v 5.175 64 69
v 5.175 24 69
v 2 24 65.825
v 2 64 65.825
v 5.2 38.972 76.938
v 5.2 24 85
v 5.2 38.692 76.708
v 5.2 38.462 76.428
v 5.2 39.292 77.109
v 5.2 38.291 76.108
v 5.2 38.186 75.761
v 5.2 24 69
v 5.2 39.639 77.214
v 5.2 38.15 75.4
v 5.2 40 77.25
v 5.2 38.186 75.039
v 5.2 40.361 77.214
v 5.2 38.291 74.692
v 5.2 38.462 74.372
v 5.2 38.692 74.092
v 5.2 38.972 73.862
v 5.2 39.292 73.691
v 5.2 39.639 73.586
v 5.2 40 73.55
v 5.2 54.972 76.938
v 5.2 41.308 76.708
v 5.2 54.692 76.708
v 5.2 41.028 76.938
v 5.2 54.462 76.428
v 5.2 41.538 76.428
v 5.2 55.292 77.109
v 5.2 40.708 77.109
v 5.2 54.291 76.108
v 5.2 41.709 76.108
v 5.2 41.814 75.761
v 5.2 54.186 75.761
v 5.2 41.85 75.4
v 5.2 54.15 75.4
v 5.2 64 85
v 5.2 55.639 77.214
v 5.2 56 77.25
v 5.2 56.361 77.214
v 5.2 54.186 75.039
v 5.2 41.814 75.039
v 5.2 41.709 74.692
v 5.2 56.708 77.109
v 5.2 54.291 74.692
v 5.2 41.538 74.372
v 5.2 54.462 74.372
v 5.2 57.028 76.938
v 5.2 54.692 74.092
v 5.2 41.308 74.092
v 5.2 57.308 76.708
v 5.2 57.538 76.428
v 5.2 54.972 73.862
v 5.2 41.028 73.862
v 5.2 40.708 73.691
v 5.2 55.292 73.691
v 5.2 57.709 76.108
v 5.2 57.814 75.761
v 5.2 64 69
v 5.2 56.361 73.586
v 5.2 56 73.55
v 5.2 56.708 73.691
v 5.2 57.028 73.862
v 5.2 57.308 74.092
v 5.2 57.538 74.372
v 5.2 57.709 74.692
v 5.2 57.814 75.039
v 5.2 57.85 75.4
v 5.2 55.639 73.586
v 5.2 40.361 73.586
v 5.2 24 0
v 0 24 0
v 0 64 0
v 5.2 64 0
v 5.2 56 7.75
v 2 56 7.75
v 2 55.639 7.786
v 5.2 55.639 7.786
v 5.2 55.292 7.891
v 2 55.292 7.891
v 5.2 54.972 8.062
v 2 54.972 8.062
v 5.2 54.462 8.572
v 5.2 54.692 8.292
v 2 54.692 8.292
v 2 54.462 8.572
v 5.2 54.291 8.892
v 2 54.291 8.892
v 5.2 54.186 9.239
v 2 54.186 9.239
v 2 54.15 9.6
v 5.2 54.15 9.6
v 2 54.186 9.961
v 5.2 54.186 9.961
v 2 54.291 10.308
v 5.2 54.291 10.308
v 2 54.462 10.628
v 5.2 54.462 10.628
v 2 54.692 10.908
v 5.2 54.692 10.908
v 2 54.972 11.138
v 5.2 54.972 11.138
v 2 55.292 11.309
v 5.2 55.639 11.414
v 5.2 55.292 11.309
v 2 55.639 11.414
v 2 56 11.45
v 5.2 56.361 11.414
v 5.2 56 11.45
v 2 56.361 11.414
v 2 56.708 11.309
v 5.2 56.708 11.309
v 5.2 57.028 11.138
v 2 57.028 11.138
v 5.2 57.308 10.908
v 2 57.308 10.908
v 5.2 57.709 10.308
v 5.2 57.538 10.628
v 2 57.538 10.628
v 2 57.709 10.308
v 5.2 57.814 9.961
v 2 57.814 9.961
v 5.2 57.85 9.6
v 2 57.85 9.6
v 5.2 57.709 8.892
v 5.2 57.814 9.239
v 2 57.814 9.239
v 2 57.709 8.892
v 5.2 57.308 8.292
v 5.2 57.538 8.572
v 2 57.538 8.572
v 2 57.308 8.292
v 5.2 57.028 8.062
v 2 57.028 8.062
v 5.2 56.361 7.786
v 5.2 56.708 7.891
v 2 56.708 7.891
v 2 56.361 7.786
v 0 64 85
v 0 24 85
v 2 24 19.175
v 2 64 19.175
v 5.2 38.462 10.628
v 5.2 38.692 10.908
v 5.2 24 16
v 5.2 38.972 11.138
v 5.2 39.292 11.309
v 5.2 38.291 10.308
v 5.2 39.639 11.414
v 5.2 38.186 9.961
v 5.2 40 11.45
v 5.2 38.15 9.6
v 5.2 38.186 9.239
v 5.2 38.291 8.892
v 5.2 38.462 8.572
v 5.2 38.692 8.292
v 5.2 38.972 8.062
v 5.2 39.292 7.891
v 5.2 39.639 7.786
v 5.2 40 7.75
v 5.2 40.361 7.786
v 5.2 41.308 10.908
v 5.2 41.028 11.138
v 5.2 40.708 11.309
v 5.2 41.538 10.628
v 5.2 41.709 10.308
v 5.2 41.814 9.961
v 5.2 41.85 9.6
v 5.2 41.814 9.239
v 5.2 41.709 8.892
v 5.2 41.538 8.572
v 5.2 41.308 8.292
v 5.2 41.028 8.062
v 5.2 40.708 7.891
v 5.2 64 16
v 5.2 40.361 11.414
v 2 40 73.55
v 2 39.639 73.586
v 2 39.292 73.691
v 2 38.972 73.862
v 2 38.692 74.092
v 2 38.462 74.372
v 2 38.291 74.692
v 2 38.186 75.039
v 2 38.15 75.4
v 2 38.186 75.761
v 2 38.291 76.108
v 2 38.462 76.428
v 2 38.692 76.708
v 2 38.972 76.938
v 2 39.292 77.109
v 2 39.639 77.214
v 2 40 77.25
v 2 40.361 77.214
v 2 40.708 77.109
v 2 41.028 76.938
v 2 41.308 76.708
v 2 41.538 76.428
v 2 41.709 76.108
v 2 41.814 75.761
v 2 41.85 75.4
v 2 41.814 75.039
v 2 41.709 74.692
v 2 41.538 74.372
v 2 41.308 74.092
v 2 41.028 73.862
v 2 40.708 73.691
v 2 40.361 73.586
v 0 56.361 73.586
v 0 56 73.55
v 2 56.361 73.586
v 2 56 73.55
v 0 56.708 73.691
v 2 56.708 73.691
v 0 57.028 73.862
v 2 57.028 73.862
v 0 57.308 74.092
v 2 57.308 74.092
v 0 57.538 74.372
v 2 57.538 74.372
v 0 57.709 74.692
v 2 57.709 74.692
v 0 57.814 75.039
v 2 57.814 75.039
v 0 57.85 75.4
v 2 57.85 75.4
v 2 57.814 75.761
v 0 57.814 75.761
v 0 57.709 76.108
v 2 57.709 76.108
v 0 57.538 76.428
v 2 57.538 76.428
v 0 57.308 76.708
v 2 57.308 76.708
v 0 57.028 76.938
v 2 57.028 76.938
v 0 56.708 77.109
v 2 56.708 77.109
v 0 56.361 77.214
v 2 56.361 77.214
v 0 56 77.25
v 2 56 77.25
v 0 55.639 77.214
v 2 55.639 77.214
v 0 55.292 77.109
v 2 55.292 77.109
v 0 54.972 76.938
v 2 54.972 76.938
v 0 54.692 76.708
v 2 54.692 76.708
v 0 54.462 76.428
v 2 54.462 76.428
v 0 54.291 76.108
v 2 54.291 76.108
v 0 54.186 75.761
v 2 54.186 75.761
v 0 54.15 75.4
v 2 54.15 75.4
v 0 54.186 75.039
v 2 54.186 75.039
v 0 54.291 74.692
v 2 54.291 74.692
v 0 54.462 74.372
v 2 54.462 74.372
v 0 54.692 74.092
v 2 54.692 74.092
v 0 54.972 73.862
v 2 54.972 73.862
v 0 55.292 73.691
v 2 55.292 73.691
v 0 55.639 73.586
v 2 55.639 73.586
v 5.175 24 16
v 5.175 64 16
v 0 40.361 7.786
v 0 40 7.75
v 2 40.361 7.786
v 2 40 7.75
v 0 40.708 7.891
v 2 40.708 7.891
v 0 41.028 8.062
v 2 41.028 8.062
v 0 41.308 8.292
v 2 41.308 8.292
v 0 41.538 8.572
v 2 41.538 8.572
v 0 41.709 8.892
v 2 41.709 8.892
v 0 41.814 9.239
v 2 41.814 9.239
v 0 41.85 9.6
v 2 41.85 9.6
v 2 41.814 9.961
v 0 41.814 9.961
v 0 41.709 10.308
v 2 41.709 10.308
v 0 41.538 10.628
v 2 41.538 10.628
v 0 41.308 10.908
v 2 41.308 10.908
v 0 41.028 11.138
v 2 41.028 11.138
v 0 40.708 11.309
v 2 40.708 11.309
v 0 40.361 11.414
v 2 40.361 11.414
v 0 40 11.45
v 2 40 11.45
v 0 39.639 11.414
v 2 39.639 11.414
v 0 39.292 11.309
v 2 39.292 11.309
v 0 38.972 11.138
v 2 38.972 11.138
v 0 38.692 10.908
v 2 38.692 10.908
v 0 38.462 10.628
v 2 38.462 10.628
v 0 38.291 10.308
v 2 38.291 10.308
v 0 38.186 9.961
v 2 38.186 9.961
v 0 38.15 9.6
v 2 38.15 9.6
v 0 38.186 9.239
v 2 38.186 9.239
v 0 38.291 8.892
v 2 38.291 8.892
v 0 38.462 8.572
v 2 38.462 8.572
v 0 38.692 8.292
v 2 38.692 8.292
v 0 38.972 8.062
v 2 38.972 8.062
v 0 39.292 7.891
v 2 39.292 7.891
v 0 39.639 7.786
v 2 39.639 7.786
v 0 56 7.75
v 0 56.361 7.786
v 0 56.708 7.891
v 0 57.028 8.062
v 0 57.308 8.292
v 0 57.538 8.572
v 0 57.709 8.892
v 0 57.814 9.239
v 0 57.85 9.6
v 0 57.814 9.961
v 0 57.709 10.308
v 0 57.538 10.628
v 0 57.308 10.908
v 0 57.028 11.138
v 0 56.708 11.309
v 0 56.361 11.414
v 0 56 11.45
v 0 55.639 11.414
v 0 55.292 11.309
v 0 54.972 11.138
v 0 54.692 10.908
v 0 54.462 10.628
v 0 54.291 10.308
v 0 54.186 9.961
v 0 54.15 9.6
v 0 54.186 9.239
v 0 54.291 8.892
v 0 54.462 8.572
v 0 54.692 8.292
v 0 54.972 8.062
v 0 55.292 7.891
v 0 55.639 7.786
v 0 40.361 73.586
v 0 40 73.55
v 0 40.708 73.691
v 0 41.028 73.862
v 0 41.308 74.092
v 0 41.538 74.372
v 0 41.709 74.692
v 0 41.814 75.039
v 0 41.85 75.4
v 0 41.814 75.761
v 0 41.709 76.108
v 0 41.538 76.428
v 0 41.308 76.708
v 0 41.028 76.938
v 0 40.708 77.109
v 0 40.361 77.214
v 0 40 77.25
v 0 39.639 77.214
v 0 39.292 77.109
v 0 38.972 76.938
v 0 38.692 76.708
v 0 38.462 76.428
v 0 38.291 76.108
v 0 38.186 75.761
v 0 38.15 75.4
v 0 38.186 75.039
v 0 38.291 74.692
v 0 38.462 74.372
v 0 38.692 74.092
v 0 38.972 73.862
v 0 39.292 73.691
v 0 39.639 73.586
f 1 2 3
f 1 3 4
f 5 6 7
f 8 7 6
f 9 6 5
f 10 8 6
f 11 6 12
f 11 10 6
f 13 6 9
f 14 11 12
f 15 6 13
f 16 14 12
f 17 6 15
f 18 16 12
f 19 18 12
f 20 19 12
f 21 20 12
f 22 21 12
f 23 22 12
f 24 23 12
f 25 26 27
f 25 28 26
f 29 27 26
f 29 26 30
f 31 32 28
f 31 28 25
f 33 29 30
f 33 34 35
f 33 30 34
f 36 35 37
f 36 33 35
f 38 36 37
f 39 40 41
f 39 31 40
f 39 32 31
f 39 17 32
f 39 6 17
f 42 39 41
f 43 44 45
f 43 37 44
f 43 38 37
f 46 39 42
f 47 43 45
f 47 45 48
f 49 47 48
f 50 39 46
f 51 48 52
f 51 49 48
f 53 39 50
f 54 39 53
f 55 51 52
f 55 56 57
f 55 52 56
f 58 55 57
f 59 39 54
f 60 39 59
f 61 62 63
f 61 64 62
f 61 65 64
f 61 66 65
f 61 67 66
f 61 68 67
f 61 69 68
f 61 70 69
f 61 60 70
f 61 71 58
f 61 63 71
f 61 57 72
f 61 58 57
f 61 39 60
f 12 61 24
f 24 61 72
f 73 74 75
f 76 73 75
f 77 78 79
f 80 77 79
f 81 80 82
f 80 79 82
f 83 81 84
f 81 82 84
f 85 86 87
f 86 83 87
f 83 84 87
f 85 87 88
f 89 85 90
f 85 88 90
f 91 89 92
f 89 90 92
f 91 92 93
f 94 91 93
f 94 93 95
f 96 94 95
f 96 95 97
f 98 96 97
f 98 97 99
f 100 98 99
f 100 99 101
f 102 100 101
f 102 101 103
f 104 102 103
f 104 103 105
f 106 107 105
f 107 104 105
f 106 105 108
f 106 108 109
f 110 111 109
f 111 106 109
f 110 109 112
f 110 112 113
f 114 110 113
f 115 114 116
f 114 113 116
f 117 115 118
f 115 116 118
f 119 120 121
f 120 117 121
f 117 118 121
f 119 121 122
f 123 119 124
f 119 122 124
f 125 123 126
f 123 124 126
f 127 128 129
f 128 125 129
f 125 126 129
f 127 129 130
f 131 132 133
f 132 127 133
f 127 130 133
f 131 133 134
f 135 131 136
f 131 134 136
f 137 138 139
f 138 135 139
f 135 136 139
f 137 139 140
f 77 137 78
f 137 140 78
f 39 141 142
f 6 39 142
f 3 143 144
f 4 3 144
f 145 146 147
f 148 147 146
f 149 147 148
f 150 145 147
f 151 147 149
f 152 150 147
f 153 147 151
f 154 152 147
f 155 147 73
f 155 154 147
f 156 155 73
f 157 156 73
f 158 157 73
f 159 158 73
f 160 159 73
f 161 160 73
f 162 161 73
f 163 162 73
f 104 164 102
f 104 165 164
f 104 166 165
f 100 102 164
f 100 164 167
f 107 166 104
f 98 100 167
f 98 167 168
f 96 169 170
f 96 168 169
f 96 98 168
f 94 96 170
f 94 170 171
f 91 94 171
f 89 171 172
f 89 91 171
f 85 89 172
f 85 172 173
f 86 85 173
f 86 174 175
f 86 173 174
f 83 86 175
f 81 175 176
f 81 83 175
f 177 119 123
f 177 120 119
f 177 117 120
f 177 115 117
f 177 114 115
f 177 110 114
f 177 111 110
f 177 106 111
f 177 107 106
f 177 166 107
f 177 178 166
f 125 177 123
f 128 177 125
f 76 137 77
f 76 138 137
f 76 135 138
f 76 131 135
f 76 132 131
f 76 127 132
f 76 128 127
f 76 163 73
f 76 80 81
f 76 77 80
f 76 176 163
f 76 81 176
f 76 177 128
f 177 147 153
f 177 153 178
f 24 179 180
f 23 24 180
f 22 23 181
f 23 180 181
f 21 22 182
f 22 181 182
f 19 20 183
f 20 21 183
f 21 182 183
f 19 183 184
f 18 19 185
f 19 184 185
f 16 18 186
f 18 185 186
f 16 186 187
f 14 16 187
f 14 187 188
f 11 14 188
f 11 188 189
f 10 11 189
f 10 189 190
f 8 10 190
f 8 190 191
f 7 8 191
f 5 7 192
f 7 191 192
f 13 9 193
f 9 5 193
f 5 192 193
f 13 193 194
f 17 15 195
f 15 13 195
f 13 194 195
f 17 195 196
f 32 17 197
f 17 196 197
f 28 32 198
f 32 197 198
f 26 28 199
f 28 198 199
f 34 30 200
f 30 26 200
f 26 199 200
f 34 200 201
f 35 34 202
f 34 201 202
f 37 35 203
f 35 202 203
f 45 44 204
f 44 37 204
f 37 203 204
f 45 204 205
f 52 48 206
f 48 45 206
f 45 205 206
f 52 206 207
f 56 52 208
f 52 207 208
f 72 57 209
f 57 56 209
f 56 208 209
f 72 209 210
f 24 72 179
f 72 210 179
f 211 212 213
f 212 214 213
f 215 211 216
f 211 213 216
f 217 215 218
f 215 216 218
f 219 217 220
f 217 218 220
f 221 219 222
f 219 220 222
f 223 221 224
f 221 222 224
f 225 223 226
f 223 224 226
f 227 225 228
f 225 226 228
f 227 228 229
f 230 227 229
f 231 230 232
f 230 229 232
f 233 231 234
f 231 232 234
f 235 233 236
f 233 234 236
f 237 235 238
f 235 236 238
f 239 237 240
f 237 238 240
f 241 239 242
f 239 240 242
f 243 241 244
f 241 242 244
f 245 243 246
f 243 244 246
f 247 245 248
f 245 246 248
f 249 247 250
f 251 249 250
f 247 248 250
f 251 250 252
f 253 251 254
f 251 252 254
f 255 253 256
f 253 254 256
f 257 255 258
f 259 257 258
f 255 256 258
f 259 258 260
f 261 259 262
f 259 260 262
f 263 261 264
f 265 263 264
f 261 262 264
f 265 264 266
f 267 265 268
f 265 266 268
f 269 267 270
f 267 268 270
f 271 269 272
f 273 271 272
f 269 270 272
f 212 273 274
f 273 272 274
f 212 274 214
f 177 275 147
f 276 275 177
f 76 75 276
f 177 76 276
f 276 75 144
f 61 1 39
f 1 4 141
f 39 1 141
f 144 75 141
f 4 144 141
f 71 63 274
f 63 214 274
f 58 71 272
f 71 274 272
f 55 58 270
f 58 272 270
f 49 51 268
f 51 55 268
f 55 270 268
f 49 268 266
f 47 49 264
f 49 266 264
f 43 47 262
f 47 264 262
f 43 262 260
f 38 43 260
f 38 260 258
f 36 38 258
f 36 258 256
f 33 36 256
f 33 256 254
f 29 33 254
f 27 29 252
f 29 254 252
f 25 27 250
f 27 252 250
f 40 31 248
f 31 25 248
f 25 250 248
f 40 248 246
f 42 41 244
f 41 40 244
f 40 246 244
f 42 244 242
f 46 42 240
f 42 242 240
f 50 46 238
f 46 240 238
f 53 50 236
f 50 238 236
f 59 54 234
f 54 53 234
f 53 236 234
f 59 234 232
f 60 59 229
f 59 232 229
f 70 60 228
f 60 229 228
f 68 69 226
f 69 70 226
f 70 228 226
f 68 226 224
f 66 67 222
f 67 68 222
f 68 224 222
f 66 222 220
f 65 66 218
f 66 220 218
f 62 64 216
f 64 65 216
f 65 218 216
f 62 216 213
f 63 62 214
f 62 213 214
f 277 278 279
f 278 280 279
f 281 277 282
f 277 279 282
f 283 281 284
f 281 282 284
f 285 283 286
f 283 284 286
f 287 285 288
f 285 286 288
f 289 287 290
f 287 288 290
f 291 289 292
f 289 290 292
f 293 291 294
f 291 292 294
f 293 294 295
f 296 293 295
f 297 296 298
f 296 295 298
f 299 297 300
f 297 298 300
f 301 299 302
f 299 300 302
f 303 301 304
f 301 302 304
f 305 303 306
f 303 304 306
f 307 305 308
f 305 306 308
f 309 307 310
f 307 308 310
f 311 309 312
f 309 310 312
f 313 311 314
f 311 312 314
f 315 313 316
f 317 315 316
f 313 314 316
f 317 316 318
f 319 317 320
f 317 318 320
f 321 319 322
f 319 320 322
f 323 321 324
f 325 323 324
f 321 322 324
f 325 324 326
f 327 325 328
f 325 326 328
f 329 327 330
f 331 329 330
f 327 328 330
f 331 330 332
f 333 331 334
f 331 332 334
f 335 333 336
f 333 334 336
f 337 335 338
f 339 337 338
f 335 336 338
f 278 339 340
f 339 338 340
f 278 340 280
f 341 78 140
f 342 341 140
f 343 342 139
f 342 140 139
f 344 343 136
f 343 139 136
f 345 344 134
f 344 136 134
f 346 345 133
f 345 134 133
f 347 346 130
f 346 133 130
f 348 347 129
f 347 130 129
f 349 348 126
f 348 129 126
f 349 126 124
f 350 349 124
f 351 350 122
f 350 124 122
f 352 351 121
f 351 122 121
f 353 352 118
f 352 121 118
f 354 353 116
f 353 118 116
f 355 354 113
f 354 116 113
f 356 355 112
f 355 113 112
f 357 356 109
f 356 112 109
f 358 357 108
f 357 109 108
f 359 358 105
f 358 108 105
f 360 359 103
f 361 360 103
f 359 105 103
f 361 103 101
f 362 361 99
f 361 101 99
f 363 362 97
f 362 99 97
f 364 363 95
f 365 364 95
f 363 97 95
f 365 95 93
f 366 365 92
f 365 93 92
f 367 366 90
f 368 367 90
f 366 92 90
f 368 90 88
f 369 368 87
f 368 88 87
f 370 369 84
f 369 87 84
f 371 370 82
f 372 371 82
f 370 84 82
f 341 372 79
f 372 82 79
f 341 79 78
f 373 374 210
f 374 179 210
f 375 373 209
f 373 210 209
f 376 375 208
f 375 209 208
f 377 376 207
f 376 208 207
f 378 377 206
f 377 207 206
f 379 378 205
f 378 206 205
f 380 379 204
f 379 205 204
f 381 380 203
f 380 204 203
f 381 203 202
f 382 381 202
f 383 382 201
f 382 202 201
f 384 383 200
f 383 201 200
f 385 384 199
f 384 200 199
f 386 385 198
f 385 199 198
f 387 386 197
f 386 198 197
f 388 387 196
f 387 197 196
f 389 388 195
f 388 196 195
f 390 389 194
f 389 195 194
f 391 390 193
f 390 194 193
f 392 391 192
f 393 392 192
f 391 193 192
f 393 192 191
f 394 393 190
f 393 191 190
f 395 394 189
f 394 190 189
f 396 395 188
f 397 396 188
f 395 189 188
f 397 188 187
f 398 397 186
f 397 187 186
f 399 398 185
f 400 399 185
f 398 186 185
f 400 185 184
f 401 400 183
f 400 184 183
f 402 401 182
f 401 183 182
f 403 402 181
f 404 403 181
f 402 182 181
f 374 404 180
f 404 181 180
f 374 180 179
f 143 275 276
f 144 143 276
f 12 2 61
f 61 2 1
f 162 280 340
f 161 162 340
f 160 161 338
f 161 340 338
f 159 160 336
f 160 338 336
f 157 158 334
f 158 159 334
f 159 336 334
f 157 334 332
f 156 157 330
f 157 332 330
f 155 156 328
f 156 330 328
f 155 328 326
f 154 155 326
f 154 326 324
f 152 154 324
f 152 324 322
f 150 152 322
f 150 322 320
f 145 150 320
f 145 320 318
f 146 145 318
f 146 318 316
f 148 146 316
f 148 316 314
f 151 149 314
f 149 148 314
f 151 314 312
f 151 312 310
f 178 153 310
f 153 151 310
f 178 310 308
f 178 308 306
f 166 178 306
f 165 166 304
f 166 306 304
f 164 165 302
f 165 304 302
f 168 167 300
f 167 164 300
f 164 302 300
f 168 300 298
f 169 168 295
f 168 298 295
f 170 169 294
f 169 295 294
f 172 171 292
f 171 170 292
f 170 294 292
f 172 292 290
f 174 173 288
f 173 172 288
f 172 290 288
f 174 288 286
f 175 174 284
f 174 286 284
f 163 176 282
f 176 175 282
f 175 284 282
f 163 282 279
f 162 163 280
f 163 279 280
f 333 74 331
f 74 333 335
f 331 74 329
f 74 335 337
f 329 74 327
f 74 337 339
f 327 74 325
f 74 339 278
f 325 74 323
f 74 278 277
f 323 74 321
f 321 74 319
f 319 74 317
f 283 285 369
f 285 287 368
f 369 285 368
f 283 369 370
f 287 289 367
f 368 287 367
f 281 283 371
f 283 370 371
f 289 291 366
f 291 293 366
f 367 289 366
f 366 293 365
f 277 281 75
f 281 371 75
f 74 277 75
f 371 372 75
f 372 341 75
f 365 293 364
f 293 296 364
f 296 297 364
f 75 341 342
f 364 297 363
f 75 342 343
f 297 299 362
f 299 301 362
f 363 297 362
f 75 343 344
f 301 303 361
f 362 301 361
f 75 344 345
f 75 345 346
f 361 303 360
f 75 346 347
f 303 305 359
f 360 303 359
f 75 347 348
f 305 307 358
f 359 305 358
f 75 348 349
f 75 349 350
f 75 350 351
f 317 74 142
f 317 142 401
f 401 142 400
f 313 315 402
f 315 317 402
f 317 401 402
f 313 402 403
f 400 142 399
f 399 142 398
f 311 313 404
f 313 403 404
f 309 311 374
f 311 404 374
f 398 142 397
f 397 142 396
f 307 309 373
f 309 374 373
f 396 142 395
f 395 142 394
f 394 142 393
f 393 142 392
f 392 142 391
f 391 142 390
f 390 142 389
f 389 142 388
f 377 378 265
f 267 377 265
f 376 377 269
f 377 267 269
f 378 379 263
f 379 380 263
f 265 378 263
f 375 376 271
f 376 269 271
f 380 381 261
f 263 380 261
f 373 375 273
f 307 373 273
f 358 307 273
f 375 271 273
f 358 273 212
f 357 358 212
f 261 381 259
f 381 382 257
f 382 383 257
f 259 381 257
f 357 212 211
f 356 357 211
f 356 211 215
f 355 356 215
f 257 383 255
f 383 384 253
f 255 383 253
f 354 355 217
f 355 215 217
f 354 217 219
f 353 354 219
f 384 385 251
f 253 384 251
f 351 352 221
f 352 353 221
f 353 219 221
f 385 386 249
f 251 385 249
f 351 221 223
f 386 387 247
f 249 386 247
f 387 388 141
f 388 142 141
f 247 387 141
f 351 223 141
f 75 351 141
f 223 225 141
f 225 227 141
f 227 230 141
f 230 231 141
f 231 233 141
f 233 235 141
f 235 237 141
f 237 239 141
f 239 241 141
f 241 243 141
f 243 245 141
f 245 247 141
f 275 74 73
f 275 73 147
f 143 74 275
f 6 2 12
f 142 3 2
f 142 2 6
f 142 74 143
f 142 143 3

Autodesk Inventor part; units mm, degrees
ref_plane "YZ Plane" through (0, 0, 0) normal (1, 0, 0) x (0, 1, 0)
ref_plane "XZ Plane" through (0, 0, 0) normal (0, 1, 0) x (-1, 0, 0)
ref_plane "XY Plane" through (0, 0, 0) normal (0, 0, 1) x (1, 0, 0)
sketch "Sketch1" plane through (0, 0, 0) normal (1, 0, 0) x (0, 1, 0)
  line L0 (24, 0) -> (64, 0)
  line L1 (64, 0) -> (64, 85)
  line L2 (64, 85) -> (24, 85)
  line L3 (24, -2) -> (24, 0)
  line L4 (24, 0) -> (24, 85)
  line L5 (24, 0) -> (109, 0) construction
  point P0 (0, 0)
  dimension "d1" = 85
  dimension "d13" = 90
extrude "Extrusion1" add sketch "Sketch1" along normal blind 2
sketch "Sketch2" plane through (2, 0, 0) normal (1, 0, 0) x (0, 0, -1)
  circle A0 centre (-75.4, 56) radius 1.85
  circle A1 centre (-75.4, 40) radius 1.85
  circle A2 centre (-9.6, 56) radius 1.85
  circle A3 centre (-9.6, 40) radius 1.85
  line L0 (-69, 24) -> (-69, 64)
  line L1 (-16, 24) -> (-16, 64)
  line L2 (-16, 0) -> (48, 0) construction
  line L3 (-85, 64) -> (-85, 24)
  line L4 (-69, 64) -> (-85, 64)
  line L5 (-85, 64) -> (-85, 24)
  line L6 (-69, 24) -> (-69, 64)
  line L7 (0, 24) -> (0, 64)
  line L8 (-16, 64) -> (0, 64)
  line L9 (0, 64) -> (0, 24)
  line L10 (-16, 24) -> (-16, 64)
  line L11 (-85, 24) -> (0, 24)
  point P0 (-69, 0)
  dimension "d5" = 90
extrude "Extrusion2" add sketch "Sketch2" along normal blind 3.2
chamfer "Chamfer1" distance 3.175 angle 45 2 edges at (2, 44, 16) (2, 44, 69)
sketch "Sketch3" plane through (5.2, 0, 0) normal (1, 0, 0) x (0, 0, -1)
  circle A0 centre (-75.4, 56) radius 1.85
  circle A1 centre (-75.4, 40) radius 1.85
  circle A2 centre (-9.6, 40) radius 1.85
  circle A3 centre (-9.6, 56) radius 1.85
  point P0 (0, 0)
extrude "Extrusion3" cut sketch "Sketch3" against normal through all
properties part number "wheelguard"
